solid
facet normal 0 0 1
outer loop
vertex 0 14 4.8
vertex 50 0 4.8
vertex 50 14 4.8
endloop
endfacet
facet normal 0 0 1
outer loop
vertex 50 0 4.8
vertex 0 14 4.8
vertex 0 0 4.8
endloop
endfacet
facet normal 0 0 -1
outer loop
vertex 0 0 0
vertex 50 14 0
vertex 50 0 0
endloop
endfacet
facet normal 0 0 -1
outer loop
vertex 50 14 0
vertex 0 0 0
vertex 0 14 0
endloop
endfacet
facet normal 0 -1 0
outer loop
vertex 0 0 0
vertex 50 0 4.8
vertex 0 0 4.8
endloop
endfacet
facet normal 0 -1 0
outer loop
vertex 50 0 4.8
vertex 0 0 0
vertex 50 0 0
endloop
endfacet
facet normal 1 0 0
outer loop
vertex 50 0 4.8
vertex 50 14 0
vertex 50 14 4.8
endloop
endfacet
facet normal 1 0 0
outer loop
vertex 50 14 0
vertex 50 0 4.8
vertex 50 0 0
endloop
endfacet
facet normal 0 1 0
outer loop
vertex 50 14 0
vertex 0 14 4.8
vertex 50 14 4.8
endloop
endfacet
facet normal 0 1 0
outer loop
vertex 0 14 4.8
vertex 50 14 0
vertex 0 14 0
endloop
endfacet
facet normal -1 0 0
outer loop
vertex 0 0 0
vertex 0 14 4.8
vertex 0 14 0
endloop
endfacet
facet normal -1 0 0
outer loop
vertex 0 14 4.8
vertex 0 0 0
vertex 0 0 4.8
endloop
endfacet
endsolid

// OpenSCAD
side=1;//[0:Top/Bottom,1:Left/Right]

/* [Hidden] */
$fn = 100;

standoff_height = side == 0 ? 3 : 4.8;
standoff_width = 50;
standoff_length = 14.0;

cube([standoff_width, standoff_length, standoff_height]);
